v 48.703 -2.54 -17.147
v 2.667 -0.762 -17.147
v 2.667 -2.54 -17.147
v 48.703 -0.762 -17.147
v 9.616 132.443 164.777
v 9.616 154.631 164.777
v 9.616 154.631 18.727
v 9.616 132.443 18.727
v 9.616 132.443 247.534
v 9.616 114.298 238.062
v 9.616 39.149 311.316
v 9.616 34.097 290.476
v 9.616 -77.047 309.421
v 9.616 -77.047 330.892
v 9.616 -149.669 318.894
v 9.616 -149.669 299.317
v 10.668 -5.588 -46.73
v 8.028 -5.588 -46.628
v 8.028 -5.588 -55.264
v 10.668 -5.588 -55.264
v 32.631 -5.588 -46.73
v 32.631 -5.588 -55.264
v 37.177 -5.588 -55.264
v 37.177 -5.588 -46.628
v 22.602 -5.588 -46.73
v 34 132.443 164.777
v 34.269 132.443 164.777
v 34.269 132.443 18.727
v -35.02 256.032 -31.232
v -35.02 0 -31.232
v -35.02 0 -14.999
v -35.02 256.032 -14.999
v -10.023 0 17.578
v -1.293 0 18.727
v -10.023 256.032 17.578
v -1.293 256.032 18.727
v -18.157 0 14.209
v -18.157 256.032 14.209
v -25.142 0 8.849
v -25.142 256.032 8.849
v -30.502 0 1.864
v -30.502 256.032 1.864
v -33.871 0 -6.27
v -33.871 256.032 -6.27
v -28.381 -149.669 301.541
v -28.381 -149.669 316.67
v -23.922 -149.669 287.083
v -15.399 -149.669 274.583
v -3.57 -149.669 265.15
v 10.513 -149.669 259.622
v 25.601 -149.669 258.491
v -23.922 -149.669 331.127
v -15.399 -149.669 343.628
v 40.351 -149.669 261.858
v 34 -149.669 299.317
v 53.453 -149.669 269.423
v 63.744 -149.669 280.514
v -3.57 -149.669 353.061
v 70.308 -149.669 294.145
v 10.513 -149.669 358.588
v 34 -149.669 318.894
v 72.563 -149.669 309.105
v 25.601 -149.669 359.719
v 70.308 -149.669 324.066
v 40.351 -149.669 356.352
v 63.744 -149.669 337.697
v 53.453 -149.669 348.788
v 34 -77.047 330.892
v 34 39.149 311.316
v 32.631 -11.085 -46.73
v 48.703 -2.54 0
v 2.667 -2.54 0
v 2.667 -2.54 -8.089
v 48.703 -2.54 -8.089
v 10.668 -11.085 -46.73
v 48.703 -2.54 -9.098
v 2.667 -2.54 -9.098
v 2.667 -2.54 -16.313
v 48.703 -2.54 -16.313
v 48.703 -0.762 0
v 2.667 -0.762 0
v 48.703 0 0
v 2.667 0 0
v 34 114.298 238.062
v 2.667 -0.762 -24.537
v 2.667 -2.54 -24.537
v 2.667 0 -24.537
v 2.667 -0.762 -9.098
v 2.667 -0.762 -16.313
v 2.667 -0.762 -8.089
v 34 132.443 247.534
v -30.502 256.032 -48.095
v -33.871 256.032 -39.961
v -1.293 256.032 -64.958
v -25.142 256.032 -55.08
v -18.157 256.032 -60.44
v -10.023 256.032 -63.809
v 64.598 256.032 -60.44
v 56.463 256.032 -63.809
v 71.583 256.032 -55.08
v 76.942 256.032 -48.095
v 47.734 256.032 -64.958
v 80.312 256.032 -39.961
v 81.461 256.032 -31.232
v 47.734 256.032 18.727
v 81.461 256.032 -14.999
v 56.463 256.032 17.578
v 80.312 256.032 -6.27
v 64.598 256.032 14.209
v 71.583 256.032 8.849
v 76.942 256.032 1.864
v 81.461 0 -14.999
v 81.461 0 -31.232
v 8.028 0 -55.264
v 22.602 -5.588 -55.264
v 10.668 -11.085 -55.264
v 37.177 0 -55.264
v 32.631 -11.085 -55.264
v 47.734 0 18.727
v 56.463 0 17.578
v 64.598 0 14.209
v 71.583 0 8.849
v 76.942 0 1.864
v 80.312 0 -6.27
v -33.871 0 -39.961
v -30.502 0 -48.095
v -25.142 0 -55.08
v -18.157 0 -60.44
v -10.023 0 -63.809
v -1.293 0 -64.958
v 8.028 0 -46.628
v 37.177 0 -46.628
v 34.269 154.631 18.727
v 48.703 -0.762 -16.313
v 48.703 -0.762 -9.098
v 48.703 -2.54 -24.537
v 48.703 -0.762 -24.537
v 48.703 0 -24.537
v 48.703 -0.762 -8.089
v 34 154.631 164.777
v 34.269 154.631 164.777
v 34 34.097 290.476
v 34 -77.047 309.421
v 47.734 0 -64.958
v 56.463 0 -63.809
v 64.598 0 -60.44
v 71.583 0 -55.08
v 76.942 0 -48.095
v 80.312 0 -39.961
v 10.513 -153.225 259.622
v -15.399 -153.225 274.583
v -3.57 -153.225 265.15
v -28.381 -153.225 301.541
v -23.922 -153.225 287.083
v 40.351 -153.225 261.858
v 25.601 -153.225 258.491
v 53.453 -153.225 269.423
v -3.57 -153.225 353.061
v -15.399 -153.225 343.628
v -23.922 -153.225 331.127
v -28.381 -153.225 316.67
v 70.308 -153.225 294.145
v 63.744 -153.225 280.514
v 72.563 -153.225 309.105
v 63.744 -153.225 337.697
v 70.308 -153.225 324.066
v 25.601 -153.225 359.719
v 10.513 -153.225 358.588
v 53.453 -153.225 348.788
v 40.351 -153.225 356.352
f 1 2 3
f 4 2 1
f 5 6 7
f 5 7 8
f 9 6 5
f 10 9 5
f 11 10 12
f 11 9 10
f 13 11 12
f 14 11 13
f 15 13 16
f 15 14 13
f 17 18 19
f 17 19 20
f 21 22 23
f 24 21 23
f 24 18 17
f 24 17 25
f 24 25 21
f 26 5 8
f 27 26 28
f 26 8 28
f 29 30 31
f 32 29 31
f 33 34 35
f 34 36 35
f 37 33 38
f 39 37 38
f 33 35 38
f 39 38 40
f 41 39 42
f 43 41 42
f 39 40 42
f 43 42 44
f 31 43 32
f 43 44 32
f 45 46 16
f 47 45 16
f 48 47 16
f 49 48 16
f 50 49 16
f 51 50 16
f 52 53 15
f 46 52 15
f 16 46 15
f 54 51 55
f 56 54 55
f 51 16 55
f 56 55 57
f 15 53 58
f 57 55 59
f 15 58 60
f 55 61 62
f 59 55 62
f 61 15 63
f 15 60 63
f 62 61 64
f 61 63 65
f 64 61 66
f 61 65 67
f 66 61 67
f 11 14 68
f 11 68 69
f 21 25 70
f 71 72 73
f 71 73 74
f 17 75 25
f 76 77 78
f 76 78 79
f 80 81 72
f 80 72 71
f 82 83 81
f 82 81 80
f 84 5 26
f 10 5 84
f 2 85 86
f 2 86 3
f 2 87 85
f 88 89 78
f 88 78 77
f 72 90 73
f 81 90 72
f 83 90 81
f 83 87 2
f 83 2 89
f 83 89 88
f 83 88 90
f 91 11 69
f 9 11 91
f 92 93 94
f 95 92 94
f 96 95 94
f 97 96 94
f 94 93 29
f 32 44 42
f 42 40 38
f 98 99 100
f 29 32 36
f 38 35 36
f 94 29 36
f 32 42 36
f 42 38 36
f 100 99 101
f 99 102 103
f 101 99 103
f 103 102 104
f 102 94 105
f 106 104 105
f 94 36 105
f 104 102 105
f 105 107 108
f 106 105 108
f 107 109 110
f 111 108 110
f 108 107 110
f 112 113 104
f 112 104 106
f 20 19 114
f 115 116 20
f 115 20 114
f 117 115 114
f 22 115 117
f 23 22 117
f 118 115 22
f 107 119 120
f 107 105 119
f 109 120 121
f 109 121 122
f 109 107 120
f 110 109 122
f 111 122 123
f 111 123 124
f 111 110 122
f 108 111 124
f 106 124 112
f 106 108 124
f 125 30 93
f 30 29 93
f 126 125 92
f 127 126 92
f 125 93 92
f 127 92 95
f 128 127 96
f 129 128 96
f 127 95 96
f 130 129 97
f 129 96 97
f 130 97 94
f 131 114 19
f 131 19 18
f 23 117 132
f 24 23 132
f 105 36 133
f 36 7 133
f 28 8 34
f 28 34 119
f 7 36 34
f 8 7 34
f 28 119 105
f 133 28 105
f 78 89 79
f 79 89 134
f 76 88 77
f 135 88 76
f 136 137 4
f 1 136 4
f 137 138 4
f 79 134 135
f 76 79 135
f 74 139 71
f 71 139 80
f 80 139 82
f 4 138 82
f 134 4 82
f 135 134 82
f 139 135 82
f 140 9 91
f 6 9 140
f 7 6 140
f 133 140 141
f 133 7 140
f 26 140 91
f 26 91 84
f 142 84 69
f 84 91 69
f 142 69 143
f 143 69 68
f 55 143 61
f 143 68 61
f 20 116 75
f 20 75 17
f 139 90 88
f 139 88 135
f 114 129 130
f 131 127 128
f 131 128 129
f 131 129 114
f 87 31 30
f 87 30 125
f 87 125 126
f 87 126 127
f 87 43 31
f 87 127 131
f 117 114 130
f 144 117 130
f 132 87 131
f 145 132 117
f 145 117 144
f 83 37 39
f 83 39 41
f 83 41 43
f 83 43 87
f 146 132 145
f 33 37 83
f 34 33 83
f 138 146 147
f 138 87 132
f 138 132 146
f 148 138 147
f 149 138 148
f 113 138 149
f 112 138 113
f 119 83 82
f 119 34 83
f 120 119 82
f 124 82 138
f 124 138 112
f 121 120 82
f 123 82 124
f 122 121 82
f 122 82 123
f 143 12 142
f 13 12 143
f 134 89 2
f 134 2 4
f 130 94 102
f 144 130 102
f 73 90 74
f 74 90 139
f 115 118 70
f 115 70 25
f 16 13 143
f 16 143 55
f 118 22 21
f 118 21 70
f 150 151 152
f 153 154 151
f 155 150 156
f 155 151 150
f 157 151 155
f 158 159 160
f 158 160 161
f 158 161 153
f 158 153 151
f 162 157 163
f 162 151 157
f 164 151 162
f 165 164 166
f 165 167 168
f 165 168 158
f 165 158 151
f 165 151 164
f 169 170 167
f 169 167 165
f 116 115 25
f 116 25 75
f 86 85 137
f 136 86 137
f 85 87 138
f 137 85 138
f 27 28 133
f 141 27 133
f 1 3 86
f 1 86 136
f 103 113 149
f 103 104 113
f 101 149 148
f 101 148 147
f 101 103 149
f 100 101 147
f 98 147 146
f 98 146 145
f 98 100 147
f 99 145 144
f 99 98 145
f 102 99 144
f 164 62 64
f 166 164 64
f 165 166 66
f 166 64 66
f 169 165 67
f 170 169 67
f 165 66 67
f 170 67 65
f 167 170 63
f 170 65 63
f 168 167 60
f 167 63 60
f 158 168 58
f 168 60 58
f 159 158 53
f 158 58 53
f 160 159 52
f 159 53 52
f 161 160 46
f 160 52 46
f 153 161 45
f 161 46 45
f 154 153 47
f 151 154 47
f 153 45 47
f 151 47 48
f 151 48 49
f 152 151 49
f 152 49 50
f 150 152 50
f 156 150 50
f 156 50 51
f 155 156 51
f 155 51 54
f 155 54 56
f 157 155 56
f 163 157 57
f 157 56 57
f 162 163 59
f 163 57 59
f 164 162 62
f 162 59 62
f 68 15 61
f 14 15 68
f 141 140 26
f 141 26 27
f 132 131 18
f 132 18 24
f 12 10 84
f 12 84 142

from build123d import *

# Parameters (mm, degrees)
F0_W      = 116.4809949696
F0_H      = 83.6853701621
F1_DEPTH  = 256.032
F2_W      = 24.6532578021
F2_H      = 22.1879333258
F3_DEPTH  = 146.05
F5_DEPTH  = 24.384
F6_R      = 33.7265634664
F9_R      = 50.7557548826
F10_DEPTH = 3.556
F11_W     = 29.1482340544
F11_H     = 8.6365044117
F12_DEPTH = 5.588
F14_DEPTH = 8.5344
F15_W     = 46.036280226
F15_H     = 24.5366059244
F16_DEPTH = 0.762
F17_W     = 46.036280226
F17_H     = 8.0885775387
F18_DEPTH = 1.778
F19_W     = 46.036280226
F19_H     = 7.2142649442
F20_DEPTH = 1.778
F21_W     = 46.036280226
F21_H     = 7.3891170323
F22_DEPTH = 1.778


# Not quite as in the source:
# - the program builds the solid bodies; features that only make, move or delete a surface that nothing else refers to are left out


with BuildPart() as f1:
    # F0 (on Front) → F1 (new body)
    with BuildSketch(Plane.XZ):
        with Locations((23.220455274, -23.1154998764)):
            Rectangle(F0_W, F0_H)
    extrude(amount=-F1_DEPTH)

    # F2 (on face) → F3 (join)
    with BuildSketch(Plane.XY.offset(18.7271852046)):
        with Locations((21.9421936199, 143.5368284583)):
            Rectangle(F2_W, F2_H)
    extrude(amount=F3_DEPTH)

    # F4 (on face) → F5 (join)
    with BuildSketch(Plane(origin=(9.6155647188, 0, 0), x_dir=(0, -1, 0), z_dir=(-1, 0, 0))):
        Polygon((-132.4428617954, 247.5340366364), (-154.6307951212, 164.7771852046), (-132.4428617954, 164.7771852046), (-114.2979115248, 238.0615323782), (-34.0974070132, 290.4760241508), (77.0465955138, 309.4210326672), (149.6690958738, 299.3170320988), (149.6690958738, 318.8935518265), (77.0465955138, 330.8920264244), (-39.1494072974, 311.315536499), align=None)
    extrude(amount=-F5_DEPTH)

    # F6
    f6_edges = [f1.edges().sort_by_distance(p)[0] for p in [
        (-35.020042, 128.016, 18.727185),
        (81.460953, 128.016, 18.727185),
        (-35.020042, 128.016, -64.958185),
        (81.460953, 128.016, -64.958185),
    ]]
    fillet(f6_edges, radius=F6_R)

    # F9 (on face) → F10 (join)
    with BuildSketch(Plane.XZ.offset(149.6690958738)):
        with Locations((21.8075647188, 309.1052919626)):
            Circle(F9_R)
    extrude(amount=F10_DEPTH)

    # F11 (on face) → F12 (join)
    with BuildSketch(Plane.XZ):
        with Locations((22.6024175063, -50.9459078312)):
            Rectangle(F11_W, F11_H)
    extrude(amount=F12_DEPTH)

    # F13 (on face) → F14 (join)
    with BuildSketch(Plane(origin=(0, 0, -55.264160037), x_dir=(1, 0, 0), z_dir=(0, 0, -1))):
        Polygon((32.6312892139, 11.0850147903), (22.6024175063, 5.588), (32.6312892139, 5.588), align=None)
        Polygon((10.6680989265, 11.0850147903), (10.6680989265, 5.588), (22.6024175063, 5.588), align=None)
    extrude(amount=-F14_DEPTH)

    # F15 (on face) → F16 (join)
    with BuildSketch(Plane.XZ):
        with Locations((25.6846474949, -12.2683029622)):
            Rectangle(F15_W, F15_H)
    extrude(amount=F16_DEPTH)

    # F17 (on face) → F18 (join)
    with BuildSketch(Plane.XZ.offset(0.762)):
        with Locations((25.6846474949, -4.0442887694)):
            Rectangle(F17_W, F17_H)
    extrude(amount=F18_DEPTH)

    # F19 (on face) → F20 (join)
    with BuildSketch(Plane.XZ.offset(0.762)):
        with Locations((25.6846474949, -12.7054592595)):
            Rectangle(F19_W, F19_H)
    extrude(amount=F20_DEPTH)

    # F21 (on face) → F22 (join)
    with BuildSketch(Plane.XZ.offset(0.762)):
        with Locations((25.6846474949, -20.8420474082)):
            Rectangle(F21_W, F21_H)
    extrude(amount=F22_DEPTH)


solid = f1.part
